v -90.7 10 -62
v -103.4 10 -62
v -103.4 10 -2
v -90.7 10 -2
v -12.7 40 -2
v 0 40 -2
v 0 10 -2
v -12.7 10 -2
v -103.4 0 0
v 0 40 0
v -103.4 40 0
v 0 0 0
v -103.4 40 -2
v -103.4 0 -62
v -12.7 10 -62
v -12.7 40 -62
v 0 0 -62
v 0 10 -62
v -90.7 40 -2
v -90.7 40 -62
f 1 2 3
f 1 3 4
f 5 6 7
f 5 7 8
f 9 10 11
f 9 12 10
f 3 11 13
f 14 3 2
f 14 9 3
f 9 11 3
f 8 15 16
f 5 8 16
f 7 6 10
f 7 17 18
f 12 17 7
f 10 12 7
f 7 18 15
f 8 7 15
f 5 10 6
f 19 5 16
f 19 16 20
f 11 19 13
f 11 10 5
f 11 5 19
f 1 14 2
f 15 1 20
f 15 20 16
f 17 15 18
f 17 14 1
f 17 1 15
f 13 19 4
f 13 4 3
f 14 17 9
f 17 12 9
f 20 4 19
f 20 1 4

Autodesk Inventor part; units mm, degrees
ref_plane "YZ Plane" through (0, 0, 0) normal (1, 0, 0) x (0, 1, 0)
ref_plane "XZ Plane" through (0, 0, 0) normal (0, 1, 0) x (-1, 0, 0)
ref_plane "XY Plane" through (0, 0, 0) normal (0, 0, 1) x (1, 0, 0)
sketch "Sketch1" plane through (0, 0, 0) normal (0, 1, 0) x (-1, 0, 0)
  line L0 (0, 0) -> (103.4, 0)
  line L1 (103.4, 0) -> (103.4, -62)
  line L2 (103.4, -62) -> (0, -62)
  line L3 (0, -62) -> (0, 0)
  dimension "d0" = 103.4
  dimension "d1" = 62
extrude "Extrusion1" add sketch "Sketch1" along normal blind 40
sketch "Sketch2" plane through (0, 0, -62) normal (0, 0, -1) x (-1, 0, 0)
  line L0 (103.4, 40) -> (0, 40) projected
  line L1 (51.7, 40) -> (90.7, 40)
  line L2 (103.4, 0) -> (103.4, 40) projected
  line L3 (90.7, 40) -> (103.4, 40)
  line L4 (103.4, 40) -> (103.4, 10.0001)
  line L5 (103.4, 10.0001) -> (90.7, 10.0001)
  line L6 (90.7, 10.0001) -> (90.7, 40)
  line L7 (51.7, 40) -> (51.7, 19.0962)
  line L8 (0, 10.0001) -> (12.7, 10.0001)
  line L9 (12.7, 10.0001) -> (12.7, 40)
  line L10 (0, 40) -> (103.4, 40)
  line L11 (0, 0) -> (0, 40)
  dimension "d4" = 39
extrude "Extrusion2" cut sketch "Sketch2" against normal blind 60
properties part number "RPS-120-12 power supply"
